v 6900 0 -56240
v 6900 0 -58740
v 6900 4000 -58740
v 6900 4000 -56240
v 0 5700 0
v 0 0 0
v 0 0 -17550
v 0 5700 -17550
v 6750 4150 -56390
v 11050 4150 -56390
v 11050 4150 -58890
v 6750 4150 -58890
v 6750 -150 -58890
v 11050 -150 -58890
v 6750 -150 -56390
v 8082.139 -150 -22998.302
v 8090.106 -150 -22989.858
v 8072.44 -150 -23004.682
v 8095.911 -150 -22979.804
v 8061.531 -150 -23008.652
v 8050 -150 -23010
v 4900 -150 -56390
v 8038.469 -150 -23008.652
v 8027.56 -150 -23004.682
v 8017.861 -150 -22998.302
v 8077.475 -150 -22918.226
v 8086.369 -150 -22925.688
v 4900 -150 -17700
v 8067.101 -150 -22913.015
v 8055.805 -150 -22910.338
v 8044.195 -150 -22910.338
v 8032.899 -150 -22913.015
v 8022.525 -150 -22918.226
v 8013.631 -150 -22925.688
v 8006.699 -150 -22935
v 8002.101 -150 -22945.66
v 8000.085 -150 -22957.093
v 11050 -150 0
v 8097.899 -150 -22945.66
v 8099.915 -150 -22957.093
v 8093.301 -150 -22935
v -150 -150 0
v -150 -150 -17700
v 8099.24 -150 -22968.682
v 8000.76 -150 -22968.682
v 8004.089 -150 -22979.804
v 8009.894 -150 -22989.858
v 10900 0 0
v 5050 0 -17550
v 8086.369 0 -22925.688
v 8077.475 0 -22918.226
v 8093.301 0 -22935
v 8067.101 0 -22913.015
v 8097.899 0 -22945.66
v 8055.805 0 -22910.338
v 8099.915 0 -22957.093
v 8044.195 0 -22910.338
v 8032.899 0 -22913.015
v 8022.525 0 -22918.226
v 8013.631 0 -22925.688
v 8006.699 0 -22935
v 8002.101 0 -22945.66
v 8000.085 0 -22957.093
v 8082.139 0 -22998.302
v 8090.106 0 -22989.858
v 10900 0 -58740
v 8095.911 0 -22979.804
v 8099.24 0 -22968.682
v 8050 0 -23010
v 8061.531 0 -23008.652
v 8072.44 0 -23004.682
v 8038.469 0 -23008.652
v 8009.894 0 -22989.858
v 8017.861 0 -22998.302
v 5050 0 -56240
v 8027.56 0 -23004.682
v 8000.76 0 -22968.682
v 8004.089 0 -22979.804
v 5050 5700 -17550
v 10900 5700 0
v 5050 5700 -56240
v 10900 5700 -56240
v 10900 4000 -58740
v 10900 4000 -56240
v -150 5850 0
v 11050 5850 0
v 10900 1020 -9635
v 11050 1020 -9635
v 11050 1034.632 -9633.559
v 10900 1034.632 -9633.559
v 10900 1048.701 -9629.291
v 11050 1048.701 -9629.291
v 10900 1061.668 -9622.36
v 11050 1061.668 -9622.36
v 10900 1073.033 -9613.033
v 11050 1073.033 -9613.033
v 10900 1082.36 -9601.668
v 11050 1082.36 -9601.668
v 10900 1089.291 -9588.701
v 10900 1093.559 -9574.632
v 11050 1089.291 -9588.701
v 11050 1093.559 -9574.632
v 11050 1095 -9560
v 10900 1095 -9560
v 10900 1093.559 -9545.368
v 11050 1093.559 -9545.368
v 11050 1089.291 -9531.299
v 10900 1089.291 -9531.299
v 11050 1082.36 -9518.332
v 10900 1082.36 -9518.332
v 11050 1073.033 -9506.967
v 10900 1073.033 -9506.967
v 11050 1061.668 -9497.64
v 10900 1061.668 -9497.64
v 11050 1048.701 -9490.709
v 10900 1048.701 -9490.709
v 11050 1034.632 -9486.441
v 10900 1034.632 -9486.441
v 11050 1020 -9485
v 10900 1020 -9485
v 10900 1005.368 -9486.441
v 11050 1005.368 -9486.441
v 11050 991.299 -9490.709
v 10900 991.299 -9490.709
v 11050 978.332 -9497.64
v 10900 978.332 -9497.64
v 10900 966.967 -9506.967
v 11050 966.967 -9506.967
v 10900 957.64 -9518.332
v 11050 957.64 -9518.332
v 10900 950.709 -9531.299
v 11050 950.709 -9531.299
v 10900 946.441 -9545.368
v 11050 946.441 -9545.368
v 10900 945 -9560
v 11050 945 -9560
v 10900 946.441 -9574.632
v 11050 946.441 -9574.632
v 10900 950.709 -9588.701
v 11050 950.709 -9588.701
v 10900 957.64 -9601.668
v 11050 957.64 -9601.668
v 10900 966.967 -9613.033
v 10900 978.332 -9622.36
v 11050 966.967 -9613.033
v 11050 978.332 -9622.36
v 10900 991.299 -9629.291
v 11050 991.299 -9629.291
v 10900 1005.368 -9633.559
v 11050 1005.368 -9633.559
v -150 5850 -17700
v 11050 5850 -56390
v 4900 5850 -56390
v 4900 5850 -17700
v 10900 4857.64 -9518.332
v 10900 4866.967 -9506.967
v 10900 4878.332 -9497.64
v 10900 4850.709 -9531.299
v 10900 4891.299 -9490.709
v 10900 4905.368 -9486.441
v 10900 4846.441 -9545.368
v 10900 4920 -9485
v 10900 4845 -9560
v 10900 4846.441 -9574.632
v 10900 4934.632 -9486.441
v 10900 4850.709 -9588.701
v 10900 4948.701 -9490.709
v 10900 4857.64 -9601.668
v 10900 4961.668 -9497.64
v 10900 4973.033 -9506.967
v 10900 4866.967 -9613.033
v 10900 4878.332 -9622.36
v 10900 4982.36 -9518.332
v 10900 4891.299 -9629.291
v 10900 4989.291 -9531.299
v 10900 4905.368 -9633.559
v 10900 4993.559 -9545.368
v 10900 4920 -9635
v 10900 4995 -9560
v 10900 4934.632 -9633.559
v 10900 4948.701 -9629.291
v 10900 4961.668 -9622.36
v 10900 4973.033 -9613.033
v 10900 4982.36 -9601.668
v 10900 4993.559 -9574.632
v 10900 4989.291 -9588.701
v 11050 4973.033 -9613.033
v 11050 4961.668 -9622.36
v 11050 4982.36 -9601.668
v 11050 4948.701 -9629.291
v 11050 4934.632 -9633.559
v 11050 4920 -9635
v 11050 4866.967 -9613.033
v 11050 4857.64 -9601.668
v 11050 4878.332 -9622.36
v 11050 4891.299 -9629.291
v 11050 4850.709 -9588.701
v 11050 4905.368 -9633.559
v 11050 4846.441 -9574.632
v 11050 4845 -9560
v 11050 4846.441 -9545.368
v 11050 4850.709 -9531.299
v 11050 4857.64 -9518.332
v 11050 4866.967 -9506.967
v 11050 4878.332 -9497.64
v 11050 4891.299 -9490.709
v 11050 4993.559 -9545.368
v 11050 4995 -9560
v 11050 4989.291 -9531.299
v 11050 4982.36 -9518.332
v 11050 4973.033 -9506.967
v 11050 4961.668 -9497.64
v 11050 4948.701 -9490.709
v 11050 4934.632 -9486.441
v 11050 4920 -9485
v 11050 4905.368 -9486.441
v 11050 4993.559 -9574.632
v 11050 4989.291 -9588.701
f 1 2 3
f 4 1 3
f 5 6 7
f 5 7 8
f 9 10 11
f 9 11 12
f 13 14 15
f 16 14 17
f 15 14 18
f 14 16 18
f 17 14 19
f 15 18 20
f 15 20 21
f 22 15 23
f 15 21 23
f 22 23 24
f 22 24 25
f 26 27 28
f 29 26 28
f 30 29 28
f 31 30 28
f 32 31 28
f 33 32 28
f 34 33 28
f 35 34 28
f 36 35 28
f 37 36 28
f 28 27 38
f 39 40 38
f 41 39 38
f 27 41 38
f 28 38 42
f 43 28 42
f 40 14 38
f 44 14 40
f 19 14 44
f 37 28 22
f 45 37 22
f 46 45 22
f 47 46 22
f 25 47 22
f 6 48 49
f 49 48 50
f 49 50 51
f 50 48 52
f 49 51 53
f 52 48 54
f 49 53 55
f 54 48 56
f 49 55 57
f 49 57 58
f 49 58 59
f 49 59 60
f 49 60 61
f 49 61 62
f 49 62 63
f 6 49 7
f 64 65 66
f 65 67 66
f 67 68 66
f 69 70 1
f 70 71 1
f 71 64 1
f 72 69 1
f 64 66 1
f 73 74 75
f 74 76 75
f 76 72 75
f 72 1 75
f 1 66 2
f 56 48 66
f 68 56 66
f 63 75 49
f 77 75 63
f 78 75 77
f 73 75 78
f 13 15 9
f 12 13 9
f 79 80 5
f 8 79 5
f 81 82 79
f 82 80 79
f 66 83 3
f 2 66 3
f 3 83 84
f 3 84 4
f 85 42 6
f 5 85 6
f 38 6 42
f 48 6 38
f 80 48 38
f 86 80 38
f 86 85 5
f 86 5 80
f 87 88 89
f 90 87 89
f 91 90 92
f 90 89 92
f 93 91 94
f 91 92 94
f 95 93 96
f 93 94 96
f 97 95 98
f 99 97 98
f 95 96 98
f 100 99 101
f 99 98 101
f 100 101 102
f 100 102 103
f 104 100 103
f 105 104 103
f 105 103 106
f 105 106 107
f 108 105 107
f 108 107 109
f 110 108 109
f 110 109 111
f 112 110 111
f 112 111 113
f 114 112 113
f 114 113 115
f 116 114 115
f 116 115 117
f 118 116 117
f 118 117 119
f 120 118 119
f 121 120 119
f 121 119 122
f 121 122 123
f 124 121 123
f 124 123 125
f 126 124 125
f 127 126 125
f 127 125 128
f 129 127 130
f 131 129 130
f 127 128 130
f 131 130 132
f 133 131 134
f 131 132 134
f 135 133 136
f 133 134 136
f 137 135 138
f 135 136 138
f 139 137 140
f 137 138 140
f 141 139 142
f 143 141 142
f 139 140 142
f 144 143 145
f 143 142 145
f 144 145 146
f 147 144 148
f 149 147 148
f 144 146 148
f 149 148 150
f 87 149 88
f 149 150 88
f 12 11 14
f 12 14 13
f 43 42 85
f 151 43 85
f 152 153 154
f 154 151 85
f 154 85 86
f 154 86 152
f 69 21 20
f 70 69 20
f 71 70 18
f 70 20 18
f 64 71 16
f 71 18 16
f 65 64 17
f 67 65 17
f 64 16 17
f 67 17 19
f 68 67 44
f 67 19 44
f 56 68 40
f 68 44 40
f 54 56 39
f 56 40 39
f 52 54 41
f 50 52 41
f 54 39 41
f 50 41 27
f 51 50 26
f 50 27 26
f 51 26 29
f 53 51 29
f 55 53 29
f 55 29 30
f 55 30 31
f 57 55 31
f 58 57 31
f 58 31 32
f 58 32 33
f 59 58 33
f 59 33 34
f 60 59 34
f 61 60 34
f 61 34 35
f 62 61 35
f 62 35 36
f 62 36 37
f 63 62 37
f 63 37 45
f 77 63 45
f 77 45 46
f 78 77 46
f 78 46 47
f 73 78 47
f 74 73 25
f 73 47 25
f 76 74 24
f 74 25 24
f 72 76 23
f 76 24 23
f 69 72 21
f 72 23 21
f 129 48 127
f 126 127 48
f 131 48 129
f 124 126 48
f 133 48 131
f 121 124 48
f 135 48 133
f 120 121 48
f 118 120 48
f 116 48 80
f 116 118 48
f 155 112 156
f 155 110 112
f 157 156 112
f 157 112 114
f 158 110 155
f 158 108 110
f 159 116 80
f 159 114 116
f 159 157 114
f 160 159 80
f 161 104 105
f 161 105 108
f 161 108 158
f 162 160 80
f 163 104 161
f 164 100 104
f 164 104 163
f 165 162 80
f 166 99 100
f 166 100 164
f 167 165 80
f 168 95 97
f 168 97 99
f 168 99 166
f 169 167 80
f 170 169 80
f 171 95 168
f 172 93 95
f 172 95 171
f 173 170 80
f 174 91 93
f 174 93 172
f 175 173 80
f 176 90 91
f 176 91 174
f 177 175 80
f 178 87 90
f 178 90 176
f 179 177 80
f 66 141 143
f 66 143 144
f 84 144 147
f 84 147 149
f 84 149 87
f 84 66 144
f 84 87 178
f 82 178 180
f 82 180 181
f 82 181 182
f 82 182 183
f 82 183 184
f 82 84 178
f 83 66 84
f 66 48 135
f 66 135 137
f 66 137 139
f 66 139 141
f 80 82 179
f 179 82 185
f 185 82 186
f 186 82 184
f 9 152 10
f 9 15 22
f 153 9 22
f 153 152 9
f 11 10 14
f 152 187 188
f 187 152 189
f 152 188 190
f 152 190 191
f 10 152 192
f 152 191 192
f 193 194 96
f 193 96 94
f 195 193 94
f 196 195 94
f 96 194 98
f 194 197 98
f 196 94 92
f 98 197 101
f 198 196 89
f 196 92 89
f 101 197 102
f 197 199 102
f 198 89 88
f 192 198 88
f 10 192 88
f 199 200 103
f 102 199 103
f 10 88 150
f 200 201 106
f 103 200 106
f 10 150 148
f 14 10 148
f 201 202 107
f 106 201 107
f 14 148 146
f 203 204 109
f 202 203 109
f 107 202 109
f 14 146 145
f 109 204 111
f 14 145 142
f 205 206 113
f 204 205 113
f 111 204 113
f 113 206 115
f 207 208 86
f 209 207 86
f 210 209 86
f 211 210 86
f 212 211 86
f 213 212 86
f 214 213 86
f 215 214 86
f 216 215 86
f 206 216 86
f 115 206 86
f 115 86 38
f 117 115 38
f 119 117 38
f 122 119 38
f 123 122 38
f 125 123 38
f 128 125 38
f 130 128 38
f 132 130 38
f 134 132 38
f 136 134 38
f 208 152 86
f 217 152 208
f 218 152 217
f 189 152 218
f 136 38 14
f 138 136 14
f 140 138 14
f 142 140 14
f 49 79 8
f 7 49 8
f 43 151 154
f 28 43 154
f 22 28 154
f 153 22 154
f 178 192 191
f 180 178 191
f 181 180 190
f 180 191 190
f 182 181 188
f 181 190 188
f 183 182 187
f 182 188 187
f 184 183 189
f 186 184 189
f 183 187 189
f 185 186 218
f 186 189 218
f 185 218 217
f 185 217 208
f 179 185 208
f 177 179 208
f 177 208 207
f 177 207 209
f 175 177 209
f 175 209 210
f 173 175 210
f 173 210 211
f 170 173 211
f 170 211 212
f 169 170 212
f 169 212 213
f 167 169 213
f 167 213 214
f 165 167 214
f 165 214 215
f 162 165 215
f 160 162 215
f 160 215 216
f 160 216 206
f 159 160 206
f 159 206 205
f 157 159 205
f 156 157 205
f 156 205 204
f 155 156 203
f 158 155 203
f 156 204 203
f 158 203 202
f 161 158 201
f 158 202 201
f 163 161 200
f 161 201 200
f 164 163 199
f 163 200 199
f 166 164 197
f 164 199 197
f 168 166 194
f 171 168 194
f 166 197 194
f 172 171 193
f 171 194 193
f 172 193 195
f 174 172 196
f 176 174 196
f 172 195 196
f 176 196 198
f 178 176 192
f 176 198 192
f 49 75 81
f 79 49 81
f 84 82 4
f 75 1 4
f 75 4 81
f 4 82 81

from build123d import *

# Parameters (mm, degrees)
SKETCH1_W          = 11200
SKETCH1_H          = 6000
SKETCH1_W_2        = 10900
SKETCH1_H_2        = 5700
EXTRUDE1_DEPTH     = 17700
SKETCH2_W          = 6150
SKETCH2_H          = 6000
SKETCH2_W_2        = 5850
SKETCH2_H_2        = 5700
EXTRUDE2_DEPTH     = 38540
SKETCH3_W          = 4300
SKETCH3_H          = 4300
SKETCH3_W_2        = 4000
SKETCH3_H_2        = 4000
EXTRUDE3_DEPTH     = 2500
SKETCH4_W          = 4300
SKETCH4_H          = 4300
EXTRUDE4_DEPTH     = 150
EXTRUDE5_DEPTH     = 150
SKETCH6_W          = 5200
SKETCH6_H          = 6000
EXTRUDE7_DEPTH     = 150
CUT_EXTRUDE1_REACH = 11202
SKETCH7_R          = 75
CUT_EXTRUDE2_REACH = 6002
SKETCH8_R          = 50


with BuildPart() as part:
    # Sketch1 → Extrude1 (new body)
    with BuildSketch(Plane.XY):
        with Locations((5450, 2850)):
            Rectangle(SKETCH1_W, SKETCH1_H)
        with Locations((5450, 2850)):
            Rectangle(SKETCH1_W_2, SKETCH1_H_2, mode=Mode.SUBTRACT)
    extrude(amount=-EXTRUDE1_DEPTH)

    # Sketch2 → Extrude2 (add)
    with BuildSketch(Plane(origin=(0, 0, -56240), x_dir=(-1, 0, 0), z_dir=(0, 0, -1))):
        with Locations((-7975, 2850)):
            Rectangle(SKETCH2_W, SKETCH2_H)
        with Locations((-7975, 2850)):
            Rectangle(SKETCH2_W_2, SKETCH2_H_2, mode=Mode.SUBTRACT)
    extrude(amount=-EXTRUDE2_DEPTH)

    # Sketch3 → Extrude3 (add)
    with BuildSketch(Plane(origin=(0, 0, -58740), x_dir=(-1, 0, 0), z_dir=(0, 0, -1))):
        with Locations((-8900, 2000)):
            Rectangle(SKETCH3_W, SKETCH3_H)
        with Locations((-8900, 2000)):
            Rectangle(SKETCH3_W_2, SKETCH3_H_2, mode=Mode.SUBTRACT)
    extrude(amount=-EXTRUDE3_DEPTH)

    # Sketch4 → Extrude4 (add)
    with BuildSketch(Plane(origin=(0, 0, -58740), x_dir=(-1, 0, 0), z_dir=(0, 0, -1))):
        with Locations((-8900, 2000)):
            Rectangle(SKETCH4_W, SKETCH4_H)
    extrude(amount=EXTRUDE4_DEPTH)

    # Sketch5 → Extrude5 (add)
    with BuildSketch(Plane(origin=(0, 0, -56240), x_dir=(-1, 0, 0), z_dir=(0, 0, -1))):
        Polygon((-11050, 5850), (-11050, 4150), (-6750, 4150), (-6750, -150), (-4900, -150), (-4900, 5850), align=None)
    extrude(amount=EXTRUDE5_DEPTH)

    # Sketch6 → Extrude7 (add)
    with BuildSketch(Plane(origin=(0, 0, -17700), x_dir=(-1, 0, 0), z_dir=(0, 0, -1))):
        with Locations((-2450, 2850)):
            Rectangle(SKETCH6_W, SKETCH6_H)
    extrude(amount=-EXTRUDE7_DEPTH)

    # Sketch7 → Cut-Extrude1 (cut, up to next)
    with BuildSketch(Plane(origin=(11050, 0, 0), x_dir=(0, 0, -1), z_dir=(1, 0, 0)), mode=Mode.PRIVATE) as cut_extrude1_sk1:
        with Locations((9560, 4920)):
            Circle(SKETCH7_R)
    cut_extrude1_tool1 = extrude(cut_extrude1_sk1.sketch, amount=-CUT_EXTRUDE1_REACH, mode=Mode.PRIVATE) & part.part
    add(cut_extrude1_tool1.solids().sort_by_distance((11050, 4920, -9560))[0], mode=Mode.SUBTRACT)
    # Sketch7 → Cut-Extrude1 (cut, up to next)
    with BuildSketch(Plane(origin=(11050, 0, 0), x_dir=(0, 0, -1), z_dir=(1, 0, 0)), mode=Mode.PRIVATE) as cut_extrude1_sk2:
        with Locations((9560, 1020)):
            Circle(SKETCH7_R)
    cut_extrude1_tool2 = extrude(cut_extrude1_sk2.sketch, amount=-CUT_EXTRUDE1_REACH, mode=Mode.PRIVATE) & part.part
    add(cut_extrude1_tool2.solids().sort_by_distance((11050, 1020, -9560))[0], mode=Mode.SUBTRACT)

    # Sketch8 → Cut-Extrude2 (cut, up to next)
    with BuildSketch(Plane.XZ.offset(150), mode=Mode.PRIVATE) as cut_extrude2_sk1:
        with Locations(Location((8050, -22960, 0), (0, 0, 270))):  # turned: the seam where the file's is
            Circle(SKETCH8_R)
    cut_extrude2_tool1 = extrude(cut_extrude2_sk1.sketch, amount=-CUT_EXTRUDE2_REACH, mode=Mode.PRIVATE) & part.part
    add(cut_extrude2_tool1.solids().sort_by_distance((8050, -150, -22960))[0], mode=Mode.SUBTRACT)


solid = part.part
